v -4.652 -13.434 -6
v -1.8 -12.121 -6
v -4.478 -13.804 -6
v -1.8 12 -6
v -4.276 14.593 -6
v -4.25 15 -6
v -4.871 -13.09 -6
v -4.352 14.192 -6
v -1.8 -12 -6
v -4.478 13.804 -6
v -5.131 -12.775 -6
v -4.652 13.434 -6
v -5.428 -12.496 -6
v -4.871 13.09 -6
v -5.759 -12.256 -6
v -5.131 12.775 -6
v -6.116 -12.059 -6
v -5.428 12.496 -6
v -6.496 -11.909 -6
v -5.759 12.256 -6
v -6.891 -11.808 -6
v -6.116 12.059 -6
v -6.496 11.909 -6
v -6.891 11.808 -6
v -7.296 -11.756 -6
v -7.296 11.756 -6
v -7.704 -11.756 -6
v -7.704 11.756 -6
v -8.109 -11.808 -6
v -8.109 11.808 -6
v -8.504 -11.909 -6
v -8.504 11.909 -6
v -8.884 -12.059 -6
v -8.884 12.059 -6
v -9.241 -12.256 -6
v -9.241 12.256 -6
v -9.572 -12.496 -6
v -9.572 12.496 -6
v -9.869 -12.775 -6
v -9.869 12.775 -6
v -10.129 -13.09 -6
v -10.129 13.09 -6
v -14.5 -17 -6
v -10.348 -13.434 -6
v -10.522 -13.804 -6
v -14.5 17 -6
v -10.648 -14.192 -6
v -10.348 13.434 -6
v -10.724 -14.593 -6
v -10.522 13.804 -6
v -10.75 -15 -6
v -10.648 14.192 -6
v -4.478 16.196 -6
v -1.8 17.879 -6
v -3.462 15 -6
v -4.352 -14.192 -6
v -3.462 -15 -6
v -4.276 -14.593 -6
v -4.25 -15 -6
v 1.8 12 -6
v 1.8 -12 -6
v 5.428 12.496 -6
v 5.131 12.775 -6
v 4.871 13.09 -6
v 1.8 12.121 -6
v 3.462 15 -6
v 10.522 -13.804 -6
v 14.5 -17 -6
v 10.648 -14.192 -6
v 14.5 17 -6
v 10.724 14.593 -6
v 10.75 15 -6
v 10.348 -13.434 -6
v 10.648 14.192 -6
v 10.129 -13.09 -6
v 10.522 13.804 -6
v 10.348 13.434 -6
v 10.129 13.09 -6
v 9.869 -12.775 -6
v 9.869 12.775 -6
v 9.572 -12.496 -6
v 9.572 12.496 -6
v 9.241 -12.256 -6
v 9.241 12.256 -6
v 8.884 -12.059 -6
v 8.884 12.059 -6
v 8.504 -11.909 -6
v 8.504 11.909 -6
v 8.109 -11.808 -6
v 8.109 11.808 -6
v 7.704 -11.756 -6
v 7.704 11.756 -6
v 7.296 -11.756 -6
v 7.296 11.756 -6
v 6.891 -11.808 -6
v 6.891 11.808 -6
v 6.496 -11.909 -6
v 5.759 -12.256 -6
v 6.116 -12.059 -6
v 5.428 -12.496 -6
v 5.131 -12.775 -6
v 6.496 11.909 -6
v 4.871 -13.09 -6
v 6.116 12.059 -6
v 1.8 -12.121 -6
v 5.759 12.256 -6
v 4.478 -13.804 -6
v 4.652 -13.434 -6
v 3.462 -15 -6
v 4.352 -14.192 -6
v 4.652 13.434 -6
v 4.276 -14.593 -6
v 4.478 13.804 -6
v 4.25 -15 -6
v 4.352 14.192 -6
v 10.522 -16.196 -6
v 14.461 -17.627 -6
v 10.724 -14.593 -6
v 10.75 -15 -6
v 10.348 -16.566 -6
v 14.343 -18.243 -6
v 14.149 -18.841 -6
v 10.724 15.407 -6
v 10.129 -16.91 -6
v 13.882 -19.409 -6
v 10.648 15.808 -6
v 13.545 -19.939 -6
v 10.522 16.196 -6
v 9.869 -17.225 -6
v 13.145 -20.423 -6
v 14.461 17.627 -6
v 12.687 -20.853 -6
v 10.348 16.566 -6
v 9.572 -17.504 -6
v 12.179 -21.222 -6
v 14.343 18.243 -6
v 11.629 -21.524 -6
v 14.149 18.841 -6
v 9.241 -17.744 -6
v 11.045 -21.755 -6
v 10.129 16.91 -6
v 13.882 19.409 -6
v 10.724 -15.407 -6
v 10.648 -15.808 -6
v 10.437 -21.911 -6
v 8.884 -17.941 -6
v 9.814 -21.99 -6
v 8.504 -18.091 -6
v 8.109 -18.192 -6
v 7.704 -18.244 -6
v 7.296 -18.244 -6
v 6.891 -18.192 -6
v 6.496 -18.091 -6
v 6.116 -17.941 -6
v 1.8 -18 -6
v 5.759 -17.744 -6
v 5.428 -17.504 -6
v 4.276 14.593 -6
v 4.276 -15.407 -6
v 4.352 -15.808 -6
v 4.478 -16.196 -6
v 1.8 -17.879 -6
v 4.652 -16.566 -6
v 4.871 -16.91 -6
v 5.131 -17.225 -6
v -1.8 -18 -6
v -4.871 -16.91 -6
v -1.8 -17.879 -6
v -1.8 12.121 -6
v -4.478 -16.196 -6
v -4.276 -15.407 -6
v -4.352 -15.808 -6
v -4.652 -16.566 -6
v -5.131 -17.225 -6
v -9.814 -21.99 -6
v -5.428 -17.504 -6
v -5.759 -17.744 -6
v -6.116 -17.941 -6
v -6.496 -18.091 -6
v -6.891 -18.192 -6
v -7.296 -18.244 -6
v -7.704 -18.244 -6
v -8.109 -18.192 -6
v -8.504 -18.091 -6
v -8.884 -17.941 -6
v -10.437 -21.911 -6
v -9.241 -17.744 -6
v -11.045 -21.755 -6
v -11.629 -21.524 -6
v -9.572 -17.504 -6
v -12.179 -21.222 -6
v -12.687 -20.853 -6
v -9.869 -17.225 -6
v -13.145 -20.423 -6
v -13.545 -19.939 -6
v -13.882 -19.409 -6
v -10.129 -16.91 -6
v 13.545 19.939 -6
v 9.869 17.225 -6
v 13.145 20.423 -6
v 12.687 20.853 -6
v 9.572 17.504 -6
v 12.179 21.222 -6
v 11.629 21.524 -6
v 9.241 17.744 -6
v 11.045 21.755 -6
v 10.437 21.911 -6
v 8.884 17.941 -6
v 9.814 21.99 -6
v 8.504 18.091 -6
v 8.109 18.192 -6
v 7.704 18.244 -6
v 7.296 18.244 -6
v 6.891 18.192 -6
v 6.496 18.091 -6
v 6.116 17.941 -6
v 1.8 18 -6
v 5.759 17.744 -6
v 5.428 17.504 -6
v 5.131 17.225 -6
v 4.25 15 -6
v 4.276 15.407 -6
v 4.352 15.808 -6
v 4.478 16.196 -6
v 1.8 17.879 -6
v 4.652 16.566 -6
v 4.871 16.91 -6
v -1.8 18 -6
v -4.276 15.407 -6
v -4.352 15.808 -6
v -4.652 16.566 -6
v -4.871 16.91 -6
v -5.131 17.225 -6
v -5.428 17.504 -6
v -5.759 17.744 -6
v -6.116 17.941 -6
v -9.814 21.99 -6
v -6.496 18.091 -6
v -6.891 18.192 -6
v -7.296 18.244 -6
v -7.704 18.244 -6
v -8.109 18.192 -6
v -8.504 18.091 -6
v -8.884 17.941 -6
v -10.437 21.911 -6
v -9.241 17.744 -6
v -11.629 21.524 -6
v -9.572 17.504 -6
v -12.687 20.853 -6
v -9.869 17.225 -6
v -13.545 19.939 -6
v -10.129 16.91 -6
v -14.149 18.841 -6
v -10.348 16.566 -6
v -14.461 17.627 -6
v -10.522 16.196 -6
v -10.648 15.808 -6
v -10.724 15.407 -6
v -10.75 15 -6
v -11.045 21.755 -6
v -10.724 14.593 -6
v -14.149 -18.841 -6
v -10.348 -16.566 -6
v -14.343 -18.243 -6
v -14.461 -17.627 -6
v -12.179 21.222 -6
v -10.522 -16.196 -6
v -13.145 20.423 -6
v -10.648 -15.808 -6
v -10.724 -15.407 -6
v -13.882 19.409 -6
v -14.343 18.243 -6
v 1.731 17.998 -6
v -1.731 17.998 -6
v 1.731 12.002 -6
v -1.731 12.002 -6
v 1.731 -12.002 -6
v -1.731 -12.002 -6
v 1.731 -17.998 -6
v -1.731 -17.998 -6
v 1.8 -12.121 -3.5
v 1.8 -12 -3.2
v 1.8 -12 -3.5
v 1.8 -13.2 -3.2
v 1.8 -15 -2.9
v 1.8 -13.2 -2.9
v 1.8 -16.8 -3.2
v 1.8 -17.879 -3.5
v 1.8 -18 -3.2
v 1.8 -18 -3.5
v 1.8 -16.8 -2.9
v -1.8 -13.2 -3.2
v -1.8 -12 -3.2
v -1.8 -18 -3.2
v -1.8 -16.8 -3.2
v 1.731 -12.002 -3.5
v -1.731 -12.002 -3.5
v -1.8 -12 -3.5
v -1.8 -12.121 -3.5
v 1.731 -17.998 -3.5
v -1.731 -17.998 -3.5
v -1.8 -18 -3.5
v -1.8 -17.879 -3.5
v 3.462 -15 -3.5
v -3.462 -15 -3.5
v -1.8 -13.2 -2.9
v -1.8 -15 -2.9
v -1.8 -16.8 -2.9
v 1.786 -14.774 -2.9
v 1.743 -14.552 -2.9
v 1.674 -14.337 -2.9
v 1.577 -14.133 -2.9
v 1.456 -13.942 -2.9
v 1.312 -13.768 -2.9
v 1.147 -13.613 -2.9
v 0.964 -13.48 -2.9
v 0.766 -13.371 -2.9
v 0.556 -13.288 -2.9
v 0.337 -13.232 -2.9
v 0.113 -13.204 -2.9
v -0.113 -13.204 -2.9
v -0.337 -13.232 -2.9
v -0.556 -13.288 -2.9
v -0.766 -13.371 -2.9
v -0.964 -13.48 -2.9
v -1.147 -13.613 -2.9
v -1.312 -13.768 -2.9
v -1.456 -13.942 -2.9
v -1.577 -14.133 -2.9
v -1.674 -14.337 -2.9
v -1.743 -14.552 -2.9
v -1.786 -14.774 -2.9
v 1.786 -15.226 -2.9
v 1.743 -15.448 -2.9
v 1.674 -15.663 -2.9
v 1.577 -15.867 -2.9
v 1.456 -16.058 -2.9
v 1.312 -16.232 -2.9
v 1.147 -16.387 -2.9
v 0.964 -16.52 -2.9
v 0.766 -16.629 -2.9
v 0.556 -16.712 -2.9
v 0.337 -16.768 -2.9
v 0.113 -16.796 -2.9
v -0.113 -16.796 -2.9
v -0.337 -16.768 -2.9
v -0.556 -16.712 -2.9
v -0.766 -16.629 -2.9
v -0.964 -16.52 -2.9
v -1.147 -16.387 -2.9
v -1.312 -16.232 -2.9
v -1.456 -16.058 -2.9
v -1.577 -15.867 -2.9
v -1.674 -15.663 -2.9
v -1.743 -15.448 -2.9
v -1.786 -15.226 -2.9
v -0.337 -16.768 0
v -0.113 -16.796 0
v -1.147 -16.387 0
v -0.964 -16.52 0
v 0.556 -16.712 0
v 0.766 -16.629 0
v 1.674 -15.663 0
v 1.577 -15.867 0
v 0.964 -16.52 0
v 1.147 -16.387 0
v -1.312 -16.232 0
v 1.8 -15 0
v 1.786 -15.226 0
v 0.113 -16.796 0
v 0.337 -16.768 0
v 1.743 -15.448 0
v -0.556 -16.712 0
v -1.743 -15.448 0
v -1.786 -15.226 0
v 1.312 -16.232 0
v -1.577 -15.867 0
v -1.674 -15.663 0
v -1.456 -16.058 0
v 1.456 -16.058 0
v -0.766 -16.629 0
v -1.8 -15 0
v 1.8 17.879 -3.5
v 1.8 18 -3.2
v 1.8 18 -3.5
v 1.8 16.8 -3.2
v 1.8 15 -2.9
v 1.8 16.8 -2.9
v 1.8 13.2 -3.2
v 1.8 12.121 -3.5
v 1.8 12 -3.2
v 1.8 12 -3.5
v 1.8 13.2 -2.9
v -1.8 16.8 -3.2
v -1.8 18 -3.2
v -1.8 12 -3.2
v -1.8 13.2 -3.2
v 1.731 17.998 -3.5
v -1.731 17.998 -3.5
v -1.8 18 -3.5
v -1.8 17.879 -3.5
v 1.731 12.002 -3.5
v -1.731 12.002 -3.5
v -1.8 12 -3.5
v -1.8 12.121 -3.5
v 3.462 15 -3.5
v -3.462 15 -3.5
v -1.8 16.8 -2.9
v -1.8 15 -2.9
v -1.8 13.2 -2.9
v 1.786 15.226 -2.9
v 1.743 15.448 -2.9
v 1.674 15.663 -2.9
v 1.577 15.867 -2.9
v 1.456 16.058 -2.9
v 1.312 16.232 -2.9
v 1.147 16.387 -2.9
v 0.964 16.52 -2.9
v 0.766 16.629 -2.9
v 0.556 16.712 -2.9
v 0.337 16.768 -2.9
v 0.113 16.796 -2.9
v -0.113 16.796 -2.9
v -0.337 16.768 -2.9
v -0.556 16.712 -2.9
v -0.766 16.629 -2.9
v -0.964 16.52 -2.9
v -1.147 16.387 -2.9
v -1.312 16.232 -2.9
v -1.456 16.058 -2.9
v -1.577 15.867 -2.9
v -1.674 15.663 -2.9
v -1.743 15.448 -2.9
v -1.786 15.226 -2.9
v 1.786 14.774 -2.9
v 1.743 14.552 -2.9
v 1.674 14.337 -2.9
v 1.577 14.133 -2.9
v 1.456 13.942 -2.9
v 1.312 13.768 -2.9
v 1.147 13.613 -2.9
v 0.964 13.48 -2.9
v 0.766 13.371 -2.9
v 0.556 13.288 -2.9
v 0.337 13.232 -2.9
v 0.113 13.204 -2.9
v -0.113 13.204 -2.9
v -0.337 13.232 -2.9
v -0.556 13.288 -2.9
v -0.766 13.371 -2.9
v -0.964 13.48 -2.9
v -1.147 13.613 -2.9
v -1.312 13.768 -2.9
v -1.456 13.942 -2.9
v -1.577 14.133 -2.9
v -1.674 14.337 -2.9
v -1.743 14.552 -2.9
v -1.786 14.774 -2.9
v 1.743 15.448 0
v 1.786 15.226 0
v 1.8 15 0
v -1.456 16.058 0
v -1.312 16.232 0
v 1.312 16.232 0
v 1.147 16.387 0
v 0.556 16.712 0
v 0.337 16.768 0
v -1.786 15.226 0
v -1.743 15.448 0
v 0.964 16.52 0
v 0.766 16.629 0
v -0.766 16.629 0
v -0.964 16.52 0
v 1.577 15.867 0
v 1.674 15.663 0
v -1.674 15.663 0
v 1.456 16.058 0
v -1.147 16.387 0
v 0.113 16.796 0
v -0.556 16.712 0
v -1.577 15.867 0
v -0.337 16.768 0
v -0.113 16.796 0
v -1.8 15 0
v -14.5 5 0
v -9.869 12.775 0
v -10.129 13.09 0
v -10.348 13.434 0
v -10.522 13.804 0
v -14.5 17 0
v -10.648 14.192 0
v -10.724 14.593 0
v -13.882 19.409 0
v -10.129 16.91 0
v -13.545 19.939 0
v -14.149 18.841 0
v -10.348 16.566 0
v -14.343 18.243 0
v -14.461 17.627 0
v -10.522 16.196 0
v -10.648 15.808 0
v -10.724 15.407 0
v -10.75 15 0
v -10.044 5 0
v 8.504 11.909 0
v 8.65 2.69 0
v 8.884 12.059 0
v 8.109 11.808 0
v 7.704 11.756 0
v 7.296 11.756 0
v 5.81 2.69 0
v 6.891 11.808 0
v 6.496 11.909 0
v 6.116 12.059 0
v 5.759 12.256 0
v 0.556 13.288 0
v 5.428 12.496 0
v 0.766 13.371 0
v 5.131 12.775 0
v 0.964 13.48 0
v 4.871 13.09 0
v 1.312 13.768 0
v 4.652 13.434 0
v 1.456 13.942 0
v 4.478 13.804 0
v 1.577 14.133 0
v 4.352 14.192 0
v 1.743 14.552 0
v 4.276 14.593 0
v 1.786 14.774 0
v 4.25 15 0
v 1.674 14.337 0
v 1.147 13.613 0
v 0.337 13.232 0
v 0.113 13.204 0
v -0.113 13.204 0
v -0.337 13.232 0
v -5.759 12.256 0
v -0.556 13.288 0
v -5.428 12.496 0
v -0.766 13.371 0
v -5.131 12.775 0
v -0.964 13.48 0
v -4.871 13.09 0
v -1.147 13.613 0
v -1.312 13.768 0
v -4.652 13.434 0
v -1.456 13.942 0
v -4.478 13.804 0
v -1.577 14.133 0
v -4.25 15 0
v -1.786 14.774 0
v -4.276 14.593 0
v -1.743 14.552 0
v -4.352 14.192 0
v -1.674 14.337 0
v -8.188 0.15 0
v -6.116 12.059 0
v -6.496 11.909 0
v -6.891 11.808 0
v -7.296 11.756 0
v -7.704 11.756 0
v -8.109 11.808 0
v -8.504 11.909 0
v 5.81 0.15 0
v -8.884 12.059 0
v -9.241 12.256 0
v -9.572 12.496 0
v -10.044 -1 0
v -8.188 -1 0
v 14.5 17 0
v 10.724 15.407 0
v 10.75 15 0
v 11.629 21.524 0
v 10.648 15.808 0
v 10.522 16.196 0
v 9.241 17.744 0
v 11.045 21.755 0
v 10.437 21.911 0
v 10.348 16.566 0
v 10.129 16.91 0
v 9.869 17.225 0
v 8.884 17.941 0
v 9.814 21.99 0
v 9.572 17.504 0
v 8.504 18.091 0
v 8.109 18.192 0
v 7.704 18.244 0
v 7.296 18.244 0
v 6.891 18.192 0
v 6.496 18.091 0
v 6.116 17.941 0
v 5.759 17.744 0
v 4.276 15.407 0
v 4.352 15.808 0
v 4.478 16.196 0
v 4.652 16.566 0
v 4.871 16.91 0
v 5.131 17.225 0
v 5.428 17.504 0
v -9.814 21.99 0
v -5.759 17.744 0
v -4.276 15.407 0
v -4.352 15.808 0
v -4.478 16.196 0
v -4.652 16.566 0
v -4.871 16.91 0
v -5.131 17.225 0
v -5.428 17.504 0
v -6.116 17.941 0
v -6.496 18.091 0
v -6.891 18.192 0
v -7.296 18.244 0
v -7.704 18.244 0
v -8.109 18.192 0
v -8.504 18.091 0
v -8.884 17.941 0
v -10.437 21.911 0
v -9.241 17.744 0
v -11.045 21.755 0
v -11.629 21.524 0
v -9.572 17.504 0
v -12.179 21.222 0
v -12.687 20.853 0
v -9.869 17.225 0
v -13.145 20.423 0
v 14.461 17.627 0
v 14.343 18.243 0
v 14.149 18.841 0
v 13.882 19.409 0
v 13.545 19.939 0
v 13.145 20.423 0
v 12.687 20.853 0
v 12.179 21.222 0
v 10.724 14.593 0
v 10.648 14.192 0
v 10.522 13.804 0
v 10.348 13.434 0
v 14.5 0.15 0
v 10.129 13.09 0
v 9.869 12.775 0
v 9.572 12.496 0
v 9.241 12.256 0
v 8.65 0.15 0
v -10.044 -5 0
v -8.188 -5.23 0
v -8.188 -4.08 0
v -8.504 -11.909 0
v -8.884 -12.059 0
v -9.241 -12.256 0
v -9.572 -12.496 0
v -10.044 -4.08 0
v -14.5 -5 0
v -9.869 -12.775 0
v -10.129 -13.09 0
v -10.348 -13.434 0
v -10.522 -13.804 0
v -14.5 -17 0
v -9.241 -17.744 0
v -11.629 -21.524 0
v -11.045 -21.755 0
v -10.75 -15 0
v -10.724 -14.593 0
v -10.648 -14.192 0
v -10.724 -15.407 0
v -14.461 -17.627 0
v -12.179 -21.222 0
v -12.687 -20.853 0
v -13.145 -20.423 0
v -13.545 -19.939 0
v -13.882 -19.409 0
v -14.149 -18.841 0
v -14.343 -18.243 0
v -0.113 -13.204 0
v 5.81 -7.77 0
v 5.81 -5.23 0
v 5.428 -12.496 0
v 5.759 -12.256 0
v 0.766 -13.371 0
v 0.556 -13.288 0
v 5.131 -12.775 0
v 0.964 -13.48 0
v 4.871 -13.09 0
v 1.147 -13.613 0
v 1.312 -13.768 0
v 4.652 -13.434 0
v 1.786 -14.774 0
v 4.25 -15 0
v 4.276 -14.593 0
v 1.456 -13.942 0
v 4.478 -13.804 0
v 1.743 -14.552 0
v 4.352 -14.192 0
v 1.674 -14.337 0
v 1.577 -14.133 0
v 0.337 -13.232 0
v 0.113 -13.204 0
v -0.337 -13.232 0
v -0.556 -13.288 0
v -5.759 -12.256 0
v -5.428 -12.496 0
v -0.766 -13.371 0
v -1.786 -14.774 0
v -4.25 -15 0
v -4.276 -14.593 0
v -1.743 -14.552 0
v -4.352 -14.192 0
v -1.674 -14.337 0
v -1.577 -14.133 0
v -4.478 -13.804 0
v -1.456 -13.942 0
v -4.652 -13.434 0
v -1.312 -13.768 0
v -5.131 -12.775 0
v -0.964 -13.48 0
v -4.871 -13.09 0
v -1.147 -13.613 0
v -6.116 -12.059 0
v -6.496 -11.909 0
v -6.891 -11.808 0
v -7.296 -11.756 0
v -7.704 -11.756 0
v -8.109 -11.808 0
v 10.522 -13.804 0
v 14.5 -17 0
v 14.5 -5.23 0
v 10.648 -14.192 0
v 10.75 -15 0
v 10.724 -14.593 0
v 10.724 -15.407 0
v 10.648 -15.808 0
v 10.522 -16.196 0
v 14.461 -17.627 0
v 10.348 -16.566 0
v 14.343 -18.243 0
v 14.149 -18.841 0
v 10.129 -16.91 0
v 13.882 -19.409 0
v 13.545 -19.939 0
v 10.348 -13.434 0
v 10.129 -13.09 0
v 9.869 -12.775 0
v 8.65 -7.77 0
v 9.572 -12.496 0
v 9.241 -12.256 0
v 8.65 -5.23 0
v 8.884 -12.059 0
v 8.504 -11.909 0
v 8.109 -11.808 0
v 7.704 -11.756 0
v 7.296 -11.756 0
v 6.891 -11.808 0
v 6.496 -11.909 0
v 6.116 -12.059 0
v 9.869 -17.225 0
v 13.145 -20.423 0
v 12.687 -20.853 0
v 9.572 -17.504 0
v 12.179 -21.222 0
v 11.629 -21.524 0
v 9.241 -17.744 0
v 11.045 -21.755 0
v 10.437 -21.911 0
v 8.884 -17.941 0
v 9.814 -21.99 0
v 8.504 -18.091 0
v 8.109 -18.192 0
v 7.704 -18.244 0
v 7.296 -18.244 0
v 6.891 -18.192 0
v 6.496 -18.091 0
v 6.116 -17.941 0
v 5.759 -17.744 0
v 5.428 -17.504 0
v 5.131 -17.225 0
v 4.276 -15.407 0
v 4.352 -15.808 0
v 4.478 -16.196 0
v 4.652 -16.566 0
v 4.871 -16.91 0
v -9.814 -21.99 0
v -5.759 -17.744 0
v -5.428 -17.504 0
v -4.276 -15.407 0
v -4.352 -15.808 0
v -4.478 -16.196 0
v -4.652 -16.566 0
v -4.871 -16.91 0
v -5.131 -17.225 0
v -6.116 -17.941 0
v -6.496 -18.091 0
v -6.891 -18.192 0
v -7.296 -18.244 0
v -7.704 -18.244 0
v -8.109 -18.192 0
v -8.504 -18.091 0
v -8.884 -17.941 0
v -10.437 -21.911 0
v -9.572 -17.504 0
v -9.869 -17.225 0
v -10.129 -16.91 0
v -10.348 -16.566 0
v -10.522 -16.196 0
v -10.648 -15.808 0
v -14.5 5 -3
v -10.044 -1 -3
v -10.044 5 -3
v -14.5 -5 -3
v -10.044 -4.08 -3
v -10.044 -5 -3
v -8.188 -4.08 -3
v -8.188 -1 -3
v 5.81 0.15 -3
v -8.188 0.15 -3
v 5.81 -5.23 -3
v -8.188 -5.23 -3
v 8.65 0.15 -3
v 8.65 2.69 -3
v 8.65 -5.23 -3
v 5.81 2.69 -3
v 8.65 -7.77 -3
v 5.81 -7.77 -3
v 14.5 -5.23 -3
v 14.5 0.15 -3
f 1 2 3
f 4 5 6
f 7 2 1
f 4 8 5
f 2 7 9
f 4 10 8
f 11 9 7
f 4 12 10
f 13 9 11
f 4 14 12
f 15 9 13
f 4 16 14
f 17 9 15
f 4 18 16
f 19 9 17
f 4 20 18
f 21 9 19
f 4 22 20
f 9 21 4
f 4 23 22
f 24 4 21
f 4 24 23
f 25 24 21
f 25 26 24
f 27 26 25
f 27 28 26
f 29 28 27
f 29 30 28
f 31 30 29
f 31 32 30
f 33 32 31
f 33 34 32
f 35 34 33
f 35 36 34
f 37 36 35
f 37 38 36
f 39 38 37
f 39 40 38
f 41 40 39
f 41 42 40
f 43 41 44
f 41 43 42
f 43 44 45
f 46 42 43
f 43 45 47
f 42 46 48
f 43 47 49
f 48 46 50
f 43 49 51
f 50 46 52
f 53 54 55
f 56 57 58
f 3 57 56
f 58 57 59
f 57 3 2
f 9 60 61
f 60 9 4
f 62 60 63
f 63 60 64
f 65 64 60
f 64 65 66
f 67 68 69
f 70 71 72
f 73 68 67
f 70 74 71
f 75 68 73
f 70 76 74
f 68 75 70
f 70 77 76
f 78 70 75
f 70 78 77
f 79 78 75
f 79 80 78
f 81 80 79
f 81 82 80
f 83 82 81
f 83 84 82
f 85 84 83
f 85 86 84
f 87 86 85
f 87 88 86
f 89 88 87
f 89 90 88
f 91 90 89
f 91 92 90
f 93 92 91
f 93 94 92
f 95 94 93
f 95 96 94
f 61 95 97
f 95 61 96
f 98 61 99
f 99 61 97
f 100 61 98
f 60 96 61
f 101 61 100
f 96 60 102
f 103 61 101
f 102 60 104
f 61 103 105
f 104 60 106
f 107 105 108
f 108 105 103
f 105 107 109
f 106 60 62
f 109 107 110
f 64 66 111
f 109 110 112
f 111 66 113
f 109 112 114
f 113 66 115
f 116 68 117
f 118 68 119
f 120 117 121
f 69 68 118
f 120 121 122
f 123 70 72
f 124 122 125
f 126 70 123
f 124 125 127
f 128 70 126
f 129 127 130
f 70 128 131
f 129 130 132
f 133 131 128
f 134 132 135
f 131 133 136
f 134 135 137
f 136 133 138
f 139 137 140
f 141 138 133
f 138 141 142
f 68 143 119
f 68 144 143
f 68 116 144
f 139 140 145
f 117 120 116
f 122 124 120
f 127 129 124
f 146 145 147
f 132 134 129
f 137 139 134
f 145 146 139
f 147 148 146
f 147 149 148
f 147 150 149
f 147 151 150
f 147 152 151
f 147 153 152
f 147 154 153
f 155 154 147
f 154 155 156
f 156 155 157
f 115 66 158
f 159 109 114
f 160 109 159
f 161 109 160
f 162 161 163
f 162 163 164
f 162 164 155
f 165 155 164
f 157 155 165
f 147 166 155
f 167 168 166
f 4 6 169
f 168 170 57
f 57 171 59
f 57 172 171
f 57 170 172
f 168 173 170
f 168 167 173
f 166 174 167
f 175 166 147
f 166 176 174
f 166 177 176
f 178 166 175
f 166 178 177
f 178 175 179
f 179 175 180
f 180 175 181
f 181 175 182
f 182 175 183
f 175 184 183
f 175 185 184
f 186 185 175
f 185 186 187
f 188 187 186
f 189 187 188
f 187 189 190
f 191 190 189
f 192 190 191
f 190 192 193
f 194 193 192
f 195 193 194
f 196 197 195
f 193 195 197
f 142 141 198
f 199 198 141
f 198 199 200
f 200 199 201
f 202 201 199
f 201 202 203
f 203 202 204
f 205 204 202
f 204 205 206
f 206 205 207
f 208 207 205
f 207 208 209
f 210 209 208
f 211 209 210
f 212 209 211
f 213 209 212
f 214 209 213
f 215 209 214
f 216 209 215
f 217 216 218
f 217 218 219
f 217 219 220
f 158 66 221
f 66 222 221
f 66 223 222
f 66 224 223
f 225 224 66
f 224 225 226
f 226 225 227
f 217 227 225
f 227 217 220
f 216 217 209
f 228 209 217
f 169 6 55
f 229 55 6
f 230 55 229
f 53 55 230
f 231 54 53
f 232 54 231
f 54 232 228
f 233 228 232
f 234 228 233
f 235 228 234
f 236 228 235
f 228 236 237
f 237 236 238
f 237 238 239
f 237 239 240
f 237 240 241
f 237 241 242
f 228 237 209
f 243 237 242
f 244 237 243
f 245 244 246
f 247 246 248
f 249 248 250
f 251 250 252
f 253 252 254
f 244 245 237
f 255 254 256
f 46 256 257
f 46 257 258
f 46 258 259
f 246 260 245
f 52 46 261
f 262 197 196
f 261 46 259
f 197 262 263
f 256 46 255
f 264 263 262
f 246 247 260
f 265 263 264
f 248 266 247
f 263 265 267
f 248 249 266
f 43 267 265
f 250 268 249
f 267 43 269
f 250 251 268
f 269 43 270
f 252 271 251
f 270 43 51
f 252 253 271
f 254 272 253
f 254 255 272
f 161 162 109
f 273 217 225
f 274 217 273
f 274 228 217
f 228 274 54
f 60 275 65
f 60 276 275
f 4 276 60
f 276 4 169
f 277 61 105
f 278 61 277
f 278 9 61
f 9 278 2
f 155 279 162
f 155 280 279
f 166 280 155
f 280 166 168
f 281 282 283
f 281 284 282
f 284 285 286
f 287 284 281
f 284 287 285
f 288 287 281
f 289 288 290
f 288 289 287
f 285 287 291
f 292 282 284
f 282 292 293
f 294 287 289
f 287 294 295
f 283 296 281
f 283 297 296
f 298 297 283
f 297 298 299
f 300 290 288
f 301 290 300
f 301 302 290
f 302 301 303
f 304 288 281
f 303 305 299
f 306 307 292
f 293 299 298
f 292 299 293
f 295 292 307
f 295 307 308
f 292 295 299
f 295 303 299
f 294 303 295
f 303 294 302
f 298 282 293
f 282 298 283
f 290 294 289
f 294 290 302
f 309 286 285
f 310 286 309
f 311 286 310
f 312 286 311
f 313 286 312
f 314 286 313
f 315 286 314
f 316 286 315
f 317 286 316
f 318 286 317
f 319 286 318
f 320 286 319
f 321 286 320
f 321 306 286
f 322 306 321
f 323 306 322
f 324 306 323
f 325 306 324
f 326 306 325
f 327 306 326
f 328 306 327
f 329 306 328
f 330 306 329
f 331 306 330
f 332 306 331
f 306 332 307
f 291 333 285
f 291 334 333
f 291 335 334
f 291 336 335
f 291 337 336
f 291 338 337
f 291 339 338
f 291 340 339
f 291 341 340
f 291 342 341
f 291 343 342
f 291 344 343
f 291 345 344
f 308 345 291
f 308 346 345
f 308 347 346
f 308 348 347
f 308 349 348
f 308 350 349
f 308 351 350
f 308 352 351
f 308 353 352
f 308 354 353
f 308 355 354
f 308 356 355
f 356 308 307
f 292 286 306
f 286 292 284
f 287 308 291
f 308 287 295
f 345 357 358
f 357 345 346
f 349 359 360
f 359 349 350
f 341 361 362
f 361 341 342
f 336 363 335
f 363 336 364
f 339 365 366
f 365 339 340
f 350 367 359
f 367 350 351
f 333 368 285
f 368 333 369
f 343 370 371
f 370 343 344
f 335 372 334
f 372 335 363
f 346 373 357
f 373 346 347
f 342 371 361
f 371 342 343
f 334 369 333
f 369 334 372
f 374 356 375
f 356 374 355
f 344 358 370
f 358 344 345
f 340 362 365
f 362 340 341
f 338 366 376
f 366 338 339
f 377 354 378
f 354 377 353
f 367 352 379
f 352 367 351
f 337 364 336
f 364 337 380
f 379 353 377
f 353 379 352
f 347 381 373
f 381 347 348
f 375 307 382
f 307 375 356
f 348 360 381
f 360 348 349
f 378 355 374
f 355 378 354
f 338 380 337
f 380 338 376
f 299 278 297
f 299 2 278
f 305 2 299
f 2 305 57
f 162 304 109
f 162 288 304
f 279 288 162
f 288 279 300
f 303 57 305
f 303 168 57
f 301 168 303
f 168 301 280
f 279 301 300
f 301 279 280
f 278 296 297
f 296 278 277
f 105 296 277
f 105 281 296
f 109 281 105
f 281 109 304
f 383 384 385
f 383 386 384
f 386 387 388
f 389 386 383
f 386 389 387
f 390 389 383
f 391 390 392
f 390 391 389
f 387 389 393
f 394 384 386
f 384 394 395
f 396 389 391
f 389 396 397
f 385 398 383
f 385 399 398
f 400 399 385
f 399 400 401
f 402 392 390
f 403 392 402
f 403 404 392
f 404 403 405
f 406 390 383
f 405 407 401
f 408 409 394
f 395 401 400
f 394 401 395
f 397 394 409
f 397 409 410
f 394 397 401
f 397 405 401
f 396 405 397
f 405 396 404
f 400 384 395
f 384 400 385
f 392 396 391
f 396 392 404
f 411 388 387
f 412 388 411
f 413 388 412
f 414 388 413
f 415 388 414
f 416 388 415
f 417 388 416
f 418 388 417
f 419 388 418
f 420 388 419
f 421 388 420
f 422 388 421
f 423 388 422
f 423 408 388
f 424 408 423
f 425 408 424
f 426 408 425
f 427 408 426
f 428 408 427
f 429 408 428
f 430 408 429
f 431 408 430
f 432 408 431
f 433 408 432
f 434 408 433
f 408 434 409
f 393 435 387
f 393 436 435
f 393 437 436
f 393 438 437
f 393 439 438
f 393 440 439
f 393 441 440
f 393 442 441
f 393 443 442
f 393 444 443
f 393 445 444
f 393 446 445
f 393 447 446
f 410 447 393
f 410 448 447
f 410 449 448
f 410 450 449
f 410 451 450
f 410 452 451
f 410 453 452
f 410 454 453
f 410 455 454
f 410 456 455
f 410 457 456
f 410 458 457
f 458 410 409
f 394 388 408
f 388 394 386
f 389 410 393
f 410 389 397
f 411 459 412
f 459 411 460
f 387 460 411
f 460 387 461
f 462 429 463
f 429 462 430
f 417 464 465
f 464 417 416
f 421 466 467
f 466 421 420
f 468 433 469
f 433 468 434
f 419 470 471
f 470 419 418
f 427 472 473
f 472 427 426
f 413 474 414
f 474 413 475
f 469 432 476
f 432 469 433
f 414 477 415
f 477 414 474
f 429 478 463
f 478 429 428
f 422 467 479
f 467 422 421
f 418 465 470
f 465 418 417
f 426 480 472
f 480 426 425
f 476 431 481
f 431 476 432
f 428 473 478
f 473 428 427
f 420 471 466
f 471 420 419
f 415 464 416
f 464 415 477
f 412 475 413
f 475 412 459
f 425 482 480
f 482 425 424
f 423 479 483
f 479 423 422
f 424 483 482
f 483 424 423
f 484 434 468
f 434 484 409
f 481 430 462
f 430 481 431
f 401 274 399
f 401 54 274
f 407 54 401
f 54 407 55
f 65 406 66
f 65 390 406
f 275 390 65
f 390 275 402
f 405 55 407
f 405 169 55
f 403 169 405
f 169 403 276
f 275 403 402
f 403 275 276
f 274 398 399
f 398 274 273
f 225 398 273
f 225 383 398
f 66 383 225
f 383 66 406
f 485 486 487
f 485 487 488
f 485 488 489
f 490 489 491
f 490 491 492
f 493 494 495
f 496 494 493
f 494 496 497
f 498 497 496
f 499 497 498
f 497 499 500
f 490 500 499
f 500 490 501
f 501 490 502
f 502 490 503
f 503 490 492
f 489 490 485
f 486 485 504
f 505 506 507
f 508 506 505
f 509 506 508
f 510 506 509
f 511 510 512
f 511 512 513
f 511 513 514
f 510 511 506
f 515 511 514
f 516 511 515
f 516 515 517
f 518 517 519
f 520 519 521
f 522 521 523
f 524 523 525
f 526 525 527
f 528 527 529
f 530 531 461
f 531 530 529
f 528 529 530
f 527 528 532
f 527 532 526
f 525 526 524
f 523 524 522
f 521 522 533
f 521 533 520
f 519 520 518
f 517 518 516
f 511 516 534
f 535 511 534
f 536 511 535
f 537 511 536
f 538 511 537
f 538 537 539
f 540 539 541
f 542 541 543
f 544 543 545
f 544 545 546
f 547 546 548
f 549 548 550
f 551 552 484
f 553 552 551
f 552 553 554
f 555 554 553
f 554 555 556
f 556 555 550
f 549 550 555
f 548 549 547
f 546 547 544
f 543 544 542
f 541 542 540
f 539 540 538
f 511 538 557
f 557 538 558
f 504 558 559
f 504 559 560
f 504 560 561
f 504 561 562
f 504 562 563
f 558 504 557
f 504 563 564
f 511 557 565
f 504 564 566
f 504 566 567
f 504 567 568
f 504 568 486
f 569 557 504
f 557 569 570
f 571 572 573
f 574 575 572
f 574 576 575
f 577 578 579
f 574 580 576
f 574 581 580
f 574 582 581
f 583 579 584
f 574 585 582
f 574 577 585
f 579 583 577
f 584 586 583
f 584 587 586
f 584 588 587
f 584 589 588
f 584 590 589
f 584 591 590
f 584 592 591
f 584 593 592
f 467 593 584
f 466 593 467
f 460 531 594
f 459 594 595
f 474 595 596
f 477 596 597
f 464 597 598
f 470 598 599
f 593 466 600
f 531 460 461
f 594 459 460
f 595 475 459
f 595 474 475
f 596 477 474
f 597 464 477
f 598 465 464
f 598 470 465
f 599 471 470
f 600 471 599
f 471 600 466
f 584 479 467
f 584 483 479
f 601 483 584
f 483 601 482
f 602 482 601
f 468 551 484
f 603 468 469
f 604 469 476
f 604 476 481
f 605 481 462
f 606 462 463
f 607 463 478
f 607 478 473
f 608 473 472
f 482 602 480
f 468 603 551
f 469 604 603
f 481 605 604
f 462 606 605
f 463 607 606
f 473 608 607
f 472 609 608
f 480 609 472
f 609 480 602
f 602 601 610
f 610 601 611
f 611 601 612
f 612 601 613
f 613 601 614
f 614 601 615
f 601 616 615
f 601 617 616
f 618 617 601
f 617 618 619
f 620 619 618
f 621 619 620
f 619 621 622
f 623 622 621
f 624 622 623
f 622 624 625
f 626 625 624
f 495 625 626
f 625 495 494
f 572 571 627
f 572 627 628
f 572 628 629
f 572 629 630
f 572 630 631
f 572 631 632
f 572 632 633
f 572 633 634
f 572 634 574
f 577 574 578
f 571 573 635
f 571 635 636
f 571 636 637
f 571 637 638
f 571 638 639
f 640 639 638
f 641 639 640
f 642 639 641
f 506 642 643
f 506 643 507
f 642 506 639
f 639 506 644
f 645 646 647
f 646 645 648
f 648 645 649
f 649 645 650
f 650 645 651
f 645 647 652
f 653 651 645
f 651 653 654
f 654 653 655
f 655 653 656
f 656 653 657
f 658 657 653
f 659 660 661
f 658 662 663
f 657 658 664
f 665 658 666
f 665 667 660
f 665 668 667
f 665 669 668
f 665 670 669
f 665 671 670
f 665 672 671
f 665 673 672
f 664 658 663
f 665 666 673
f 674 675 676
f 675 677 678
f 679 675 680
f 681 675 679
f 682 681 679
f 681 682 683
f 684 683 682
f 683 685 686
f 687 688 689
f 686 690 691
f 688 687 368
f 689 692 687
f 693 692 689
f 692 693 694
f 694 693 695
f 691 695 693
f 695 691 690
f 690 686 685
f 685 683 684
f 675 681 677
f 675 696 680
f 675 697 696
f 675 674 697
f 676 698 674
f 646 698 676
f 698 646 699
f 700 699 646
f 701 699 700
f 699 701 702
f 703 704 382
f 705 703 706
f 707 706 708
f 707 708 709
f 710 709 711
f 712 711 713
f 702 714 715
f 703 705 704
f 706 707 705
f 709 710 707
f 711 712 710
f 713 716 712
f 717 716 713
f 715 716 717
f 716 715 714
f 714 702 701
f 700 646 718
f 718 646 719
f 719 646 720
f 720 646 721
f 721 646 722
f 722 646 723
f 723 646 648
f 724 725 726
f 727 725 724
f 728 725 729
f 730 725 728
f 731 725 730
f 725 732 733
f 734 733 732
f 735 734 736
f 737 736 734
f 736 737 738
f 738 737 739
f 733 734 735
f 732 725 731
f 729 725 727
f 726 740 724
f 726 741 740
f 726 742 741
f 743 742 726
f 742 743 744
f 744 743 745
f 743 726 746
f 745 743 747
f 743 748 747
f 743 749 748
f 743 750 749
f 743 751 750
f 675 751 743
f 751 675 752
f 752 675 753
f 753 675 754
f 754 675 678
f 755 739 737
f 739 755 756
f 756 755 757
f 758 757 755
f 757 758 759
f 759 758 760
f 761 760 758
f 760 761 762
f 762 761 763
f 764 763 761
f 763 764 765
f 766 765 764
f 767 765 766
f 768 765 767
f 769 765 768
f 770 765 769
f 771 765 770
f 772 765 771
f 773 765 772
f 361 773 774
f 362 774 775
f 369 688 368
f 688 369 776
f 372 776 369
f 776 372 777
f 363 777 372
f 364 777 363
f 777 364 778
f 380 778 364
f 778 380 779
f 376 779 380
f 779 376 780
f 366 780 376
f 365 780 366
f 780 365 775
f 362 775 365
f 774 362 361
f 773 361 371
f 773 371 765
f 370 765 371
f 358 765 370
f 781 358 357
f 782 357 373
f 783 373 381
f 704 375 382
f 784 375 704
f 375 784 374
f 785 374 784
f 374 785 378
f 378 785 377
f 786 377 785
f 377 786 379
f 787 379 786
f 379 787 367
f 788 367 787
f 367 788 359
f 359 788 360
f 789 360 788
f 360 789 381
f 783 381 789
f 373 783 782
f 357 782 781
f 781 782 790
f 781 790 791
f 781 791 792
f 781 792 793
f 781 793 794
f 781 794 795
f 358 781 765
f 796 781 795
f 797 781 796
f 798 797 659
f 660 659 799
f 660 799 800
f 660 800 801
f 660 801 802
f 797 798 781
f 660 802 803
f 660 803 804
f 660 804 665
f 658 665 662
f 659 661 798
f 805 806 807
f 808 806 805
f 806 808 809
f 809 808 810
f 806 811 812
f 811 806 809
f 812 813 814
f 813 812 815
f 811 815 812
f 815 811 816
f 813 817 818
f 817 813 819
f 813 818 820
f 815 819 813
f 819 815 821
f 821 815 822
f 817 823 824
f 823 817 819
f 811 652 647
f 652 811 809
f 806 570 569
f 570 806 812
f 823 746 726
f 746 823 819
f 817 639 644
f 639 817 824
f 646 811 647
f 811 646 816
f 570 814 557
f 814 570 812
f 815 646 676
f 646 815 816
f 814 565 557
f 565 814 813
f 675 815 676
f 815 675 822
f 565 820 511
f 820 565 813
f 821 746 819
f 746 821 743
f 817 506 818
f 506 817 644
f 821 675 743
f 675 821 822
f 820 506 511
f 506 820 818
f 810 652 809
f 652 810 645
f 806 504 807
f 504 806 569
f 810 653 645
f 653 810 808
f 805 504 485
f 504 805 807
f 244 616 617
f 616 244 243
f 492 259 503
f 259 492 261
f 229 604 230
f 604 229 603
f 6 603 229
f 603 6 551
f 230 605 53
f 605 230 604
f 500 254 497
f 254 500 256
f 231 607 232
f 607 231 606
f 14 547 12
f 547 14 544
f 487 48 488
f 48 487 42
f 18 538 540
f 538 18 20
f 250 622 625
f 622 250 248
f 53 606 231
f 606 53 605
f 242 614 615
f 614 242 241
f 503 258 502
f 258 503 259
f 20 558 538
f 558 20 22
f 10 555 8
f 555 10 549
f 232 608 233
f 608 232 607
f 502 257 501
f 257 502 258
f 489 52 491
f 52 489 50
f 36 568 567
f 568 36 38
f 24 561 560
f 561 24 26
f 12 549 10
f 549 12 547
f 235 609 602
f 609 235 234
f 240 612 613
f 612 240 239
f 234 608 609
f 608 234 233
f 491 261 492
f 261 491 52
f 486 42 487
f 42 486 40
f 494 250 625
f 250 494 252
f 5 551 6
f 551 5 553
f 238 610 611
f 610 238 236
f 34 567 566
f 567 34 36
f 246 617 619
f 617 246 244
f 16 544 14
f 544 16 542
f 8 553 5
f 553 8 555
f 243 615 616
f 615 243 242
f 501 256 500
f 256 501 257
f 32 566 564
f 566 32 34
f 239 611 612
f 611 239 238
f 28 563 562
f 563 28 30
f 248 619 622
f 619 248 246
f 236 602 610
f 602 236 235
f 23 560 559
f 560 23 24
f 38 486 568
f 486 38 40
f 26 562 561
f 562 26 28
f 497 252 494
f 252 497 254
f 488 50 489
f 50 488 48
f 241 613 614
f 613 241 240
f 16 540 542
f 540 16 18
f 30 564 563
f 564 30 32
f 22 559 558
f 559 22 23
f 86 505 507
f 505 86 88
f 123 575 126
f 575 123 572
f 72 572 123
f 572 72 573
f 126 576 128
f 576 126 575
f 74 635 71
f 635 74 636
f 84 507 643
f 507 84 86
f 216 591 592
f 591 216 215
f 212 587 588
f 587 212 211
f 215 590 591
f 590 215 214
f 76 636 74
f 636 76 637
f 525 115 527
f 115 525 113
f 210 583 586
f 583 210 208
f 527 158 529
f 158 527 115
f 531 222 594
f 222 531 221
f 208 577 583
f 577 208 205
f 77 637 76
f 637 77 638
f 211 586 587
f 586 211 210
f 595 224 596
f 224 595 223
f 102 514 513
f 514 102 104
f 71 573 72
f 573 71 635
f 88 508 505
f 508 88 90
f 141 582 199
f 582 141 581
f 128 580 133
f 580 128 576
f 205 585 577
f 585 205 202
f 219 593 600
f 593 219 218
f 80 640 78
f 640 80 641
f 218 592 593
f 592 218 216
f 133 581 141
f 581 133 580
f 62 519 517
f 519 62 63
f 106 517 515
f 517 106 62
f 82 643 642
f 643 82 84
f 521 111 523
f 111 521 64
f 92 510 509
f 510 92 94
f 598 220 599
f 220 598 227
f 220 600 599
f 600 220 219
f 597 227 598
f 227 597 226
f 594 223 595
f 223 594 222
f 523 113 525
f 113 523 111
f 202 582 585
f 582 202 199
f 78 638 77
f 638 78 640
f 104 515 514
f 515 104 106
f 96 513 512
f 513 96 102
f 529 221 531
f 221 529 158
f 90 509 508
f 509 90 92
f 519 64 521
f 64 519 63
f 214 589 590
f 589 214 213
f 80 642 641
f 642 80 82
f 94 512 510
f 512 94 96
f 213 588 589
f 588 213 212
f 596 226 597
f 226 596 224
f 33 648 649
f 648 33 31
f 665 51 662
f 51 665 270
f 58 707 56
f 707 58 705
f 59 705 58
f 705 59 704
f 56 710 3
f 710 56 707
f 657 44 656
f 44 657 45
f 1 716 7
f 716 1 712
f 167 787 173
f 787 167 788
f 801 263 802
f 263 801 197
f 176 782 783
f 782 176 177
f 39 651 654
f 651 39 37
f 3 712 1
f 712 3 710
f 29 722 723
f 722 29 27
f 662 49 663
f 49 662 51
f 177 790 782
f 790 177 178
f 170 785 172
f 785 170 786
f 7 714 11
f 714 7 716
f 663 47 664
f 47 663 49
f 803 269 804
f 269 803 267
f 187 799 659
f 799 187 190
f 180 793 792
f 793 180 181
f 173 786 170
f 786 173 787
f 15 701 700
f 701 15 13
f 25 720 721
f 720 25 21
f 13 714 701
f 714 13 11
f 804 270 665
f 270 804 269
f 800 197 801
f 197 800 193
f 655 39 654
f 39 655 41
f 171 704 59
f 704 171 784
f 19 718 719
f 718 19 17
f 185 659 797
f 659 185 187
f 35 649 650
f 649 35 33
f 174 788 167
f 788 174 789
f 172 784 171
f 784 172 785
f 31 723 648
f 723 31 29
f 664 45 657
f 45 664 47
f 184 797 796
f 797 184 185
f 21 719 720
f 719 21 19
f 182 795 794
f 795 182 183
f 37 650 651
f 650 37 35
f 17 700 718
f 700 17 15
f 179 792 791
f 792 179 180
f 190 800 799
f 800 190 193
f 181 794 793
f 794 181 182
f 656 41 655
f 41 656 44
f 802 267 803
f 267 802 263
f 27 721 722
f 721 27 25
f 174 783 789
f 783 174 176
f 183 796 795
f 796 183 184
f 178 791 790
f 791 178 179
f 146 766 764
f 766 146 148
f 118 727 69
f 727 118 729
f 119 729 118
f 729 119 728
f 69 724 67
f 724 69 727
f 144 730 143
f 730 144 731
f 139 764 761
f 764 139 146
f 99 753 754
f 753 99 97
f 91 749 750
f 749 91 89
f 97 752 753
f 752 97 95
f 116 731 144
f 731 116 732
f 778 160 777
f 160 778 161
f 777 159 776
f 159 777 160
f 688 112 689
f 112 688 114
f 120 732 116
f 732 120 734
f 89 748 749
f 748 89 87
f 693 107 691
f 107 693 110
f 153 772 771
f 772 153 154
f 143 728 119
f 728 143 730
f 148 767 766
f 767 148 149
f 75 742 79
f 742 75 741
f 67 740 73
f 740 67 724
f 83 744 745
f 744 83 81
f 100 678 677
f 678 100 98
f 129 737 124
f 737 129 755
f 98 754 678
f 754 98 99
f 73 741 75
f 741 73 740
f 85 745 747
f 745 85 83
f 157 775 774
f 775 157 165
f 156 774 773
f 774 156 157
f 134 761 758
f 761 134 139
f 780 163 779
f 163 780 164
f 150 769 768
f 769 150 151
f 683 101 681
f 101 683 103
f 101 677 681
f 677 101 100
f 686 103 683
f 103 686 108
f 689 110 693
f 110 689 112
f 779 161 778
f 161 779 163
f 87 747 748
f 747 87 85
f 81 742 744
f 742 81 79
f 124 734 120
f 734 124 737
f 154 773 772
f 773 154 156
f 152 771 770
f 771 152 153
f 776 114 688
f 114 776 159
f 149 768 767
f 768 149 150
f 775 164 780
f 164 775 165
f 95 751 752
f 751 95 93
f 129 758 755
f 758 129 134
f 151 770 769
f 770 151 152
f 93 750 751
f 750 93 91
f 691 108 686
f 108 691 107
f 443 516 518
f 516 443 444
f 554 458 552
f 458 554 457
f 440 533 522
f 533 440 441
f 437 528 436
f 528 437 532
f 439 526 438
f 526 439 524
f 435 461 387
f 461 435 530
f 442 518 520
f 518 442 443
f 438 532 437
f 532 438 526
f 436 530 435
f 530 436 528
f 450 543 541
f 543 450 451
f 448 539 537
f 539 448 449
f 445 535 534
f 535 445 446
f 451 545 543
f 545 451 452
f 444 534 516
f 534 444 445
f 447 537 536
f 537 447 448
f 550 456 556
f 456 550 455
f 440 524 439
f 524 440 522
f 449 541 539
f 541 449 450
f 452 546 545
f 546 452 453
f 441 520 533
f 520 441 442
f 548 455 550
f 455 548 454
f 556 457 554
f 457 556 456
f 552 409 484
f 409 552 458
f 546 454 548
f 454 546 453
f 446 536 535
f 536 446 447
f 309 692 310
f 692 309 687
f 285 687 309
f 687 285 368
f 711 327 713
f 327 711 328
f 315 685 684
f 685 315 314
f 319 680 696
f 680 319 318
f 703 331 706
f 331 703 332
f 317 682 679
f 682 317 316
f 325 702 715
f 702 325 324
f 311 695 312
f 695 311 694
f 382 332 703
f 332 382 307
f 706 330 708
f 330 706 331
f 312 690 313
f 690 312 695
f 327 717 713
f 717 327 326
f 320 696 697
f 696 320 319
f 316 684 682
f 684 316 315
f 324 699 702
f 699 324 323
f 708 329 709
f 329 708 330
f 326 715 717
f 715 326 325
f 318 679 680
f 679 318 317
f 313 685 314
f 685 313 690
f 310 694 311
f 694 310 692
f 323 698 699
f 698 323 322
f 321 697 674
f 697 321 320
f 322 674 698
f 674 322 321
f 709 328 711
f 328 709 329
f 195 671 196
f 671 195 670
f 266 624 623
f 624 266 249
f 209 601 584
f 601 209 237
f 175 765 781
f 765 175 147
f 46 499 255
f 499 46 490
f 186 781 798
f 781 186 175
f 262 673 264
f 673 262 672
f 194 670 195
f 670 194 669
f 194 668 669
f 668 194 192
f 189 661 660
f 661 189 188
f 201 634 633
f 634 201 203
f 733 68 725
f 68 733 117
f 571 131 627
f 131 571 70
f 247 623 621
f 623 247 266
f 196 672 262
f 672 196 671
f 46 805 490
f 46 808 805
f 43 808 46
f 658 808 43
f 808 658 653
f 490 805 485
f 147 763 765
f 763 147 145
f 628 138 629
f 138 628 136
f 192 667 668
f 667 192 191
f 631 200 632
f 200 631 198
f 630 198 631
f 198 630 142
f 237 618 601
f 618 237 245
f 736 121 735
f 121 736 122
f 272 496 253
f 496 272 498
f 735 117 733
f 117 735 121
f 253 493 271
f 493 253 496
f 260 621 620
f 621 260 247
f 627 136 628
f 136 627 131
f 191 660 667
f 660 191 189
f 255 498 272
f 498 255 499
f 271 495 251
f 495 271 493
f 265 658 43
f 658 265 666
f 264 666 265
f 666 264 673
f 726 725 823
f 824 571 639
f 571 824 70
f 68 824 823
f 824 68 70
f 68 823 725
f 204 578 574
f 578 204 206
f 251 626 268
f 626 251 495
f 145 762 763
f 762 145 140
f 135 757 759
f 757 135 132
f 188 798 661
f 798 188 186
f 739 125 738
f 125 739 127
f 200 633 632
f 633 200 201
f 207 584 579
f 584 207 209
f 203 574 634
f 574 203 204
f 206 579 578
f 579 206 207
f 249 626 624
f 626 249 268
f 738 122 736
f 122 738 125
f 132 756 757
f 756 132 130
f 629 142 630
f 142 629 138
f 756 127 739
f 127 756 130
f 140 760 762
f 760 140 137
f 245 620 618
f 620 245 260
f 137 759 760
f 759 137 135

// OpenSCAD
$fn = 50;


difference() {
	union() {
		*color(alpha = 1.0000000000, c = "gray") {
			translate(v = [0, 14, -6]) {
				linear_extrude(height = 3) {
					text(font = "Arial:style=Bold", halign = "center", size = 4.5000000000, text = "COMMENT description oobb_plate_shape_positive_type_6_depth_0_0_-6_pos_motor_extra_6_thickness_2_width_3_height_0_0_-6_pos_plate", valign = "center");
				}
			}
		}
		translate(v = [0, 0, -6]) {
			hull() {
				translate(v = [-9.5000000000, 17.0000000000, 0]) {
					cylinder(h = 6, r = 5);
				}
				translate(v = [9.5000000000, 17.0000000000, 0]) {
					cylinder(h = 6, r = 5);
				}
				translate(v = [-9.5000000000, -17.0000000000, 0]) {
					cylinder(h = 6, r = 5);
				}
				translate(v = [9.5000000000, -17.0000000000, 0]) {
					cylinder(h = 6, r = 5);
				}
			}
		}
		*color(alpha = 1.0000000000, c = "gray") {
			translate(v = [0, 14, -6]) {
				linear_extrude(height = 3) {
					text(font = "Arial:style=Bold", halign = "center", size = 4.5000000000, text = "COMMENT description oobb_holes_shape_p_type_0_0_-6_pos_motor_extra_6_thickness_2_width_3_height_0_0_-6_pos_plate_'left'_'right'_hole_sides_'left'_'right'_holes_true_both_holes", valign = "center");
				}
			}
		}
		*color(alpha = 1.0000000000, c = "gray") {
			translate(v = [-7.5000000000, 14, -3]) {
				rotate(a = [0, 0, 180]) {
					linear_extrude(height = 3) {
						text(font = "Arial:style=Bold", halign = "center", size = 4.5000000000, text = "COMMENT description oobb_wire_motor_shape_-7.5_0_-3_pos_motor_extra_6_thickness_2_width_3_height_0_0_-6_pos_plate_0_0_180_rot", valign = "center");
					}
				}
			}
		}
	}
	union() {
		translate(v = [0, -15, -6]) {
			rotate(a = [0, 0, 0]) {
				difference() {
					union() {
						translate(v = [-1.8000000000, -3.0000000000, -0.3000000000]) {
							cube(size = [3.6000000000, 6.0000000000, 0.3000000000]);
						}
						translate(v = [-1.8000000000, -1.8000000000, -0.6000000000]) {
							cube(size = [3.6000000000, 3.6000000000, 0.3000000000]);
						}
						translate(v = [-1.8000000000, -3.0000000000, 2.5000000000]) {
							cube(size = [3.6000000000, 6.0000000000, 0.3000000000]);
						}
						translate(v = [-1.8000000000, -1.8000000000, 2.8000000000]) {
							cube(size = [3.6000000000, 3.6000000000, 0.3000000000]);
						}
						translate(v = [0, 0, -50.0000000000]) {
							cylinder(h = 100, r = 1.8000000000);
						}
						linear_extrude(height = 2.5000000000) {
							polygon(points = [[3.4620000000, 0.0000000000], [1.7310000000, 2.9981799479], [-1.7310000000, 2.9981799479], [-3.4620000000, 0.0000000000], [-1.7310000000, -2.9981799479], [1.7310000000, -2.9981799479]]);
						}
						translate(v = [-1.8000000000, -3.0000000000, -0.3000000000]) {
							cube(size = [3.6000000000, 6.0000000000, 0.3000000000]);
						}
						translate(v = [-1.8000000000, -1.8000000000, -0.6000000000]) {
							cube(size = [3.6000000000, 3.6000000000, 0.3000000000]);
						}
						translate(v = [-1.8000000000, -3.0000000000, 2.5000000000]) {
							cube(size = [3.6000000000, 6.0000000000, 0.3000000000]);
						}
						translate(v = [-1.8000000000, -1.8000000000, 2.8000000000]) {
							cube(size = [3.6000000000, 3.6000000000, 0.3000000000]);
						}
						translate(v = [0, 0, -50.0000000000]) {
							cylinder(h = 100, r = 1.8000000000);
						}
						translate(v = [-1.8000000000, -3.0000000000, -0.3000000000]) {
							cube(size = [3.6000000000, 6.0000000000, 0.3000000000]);
						}
						translate(v = [-1.8000000000, -1.8000000000, -0.6000000000]) {
							cube(size = [3.6000000000, 3.6000000000, 0.3000000000]);
						}
						translate(v = [-1.8000000000, -3.0000000000, 2.5000000000]) {
							cube(size = [3.6000000000, 6.0000000000, 0.3000000000]);
						}
						translate(v = [-1.8000000000, -1.8000000000, 2.8000000000]) {
							cube(size = [3.6000000000, 3.6000000000, 0.3000000000]);
						}
						translate(v = [0, 0, -50.0000000000]) {
							cylinder(h = 100, r = 1.8000000000);
						}
					}
					union();
				}
			}
		}
		translate(v = [0, 15, -6]) {
			rotate(a = [0, 0, 0]) {
				difference() {
					union() {
						translate(v = [-1.8000000000, -3.0000000000, -0.3000000000]) {
							cube(size = [3.6000000000, 6.0000000000, 0.3000000000]);
						}
						translate(v = [-1.8000000000, -1.8000000000, -0.6000000000]) {
							cube(size = [3.6000000000, 3.6000000000, 0.3000000000]);
						}
						translate(v = [-1.8000000000, -3.0000000000, 2.5000000000]) {
							cube(size = [3.6000000000, 6.0000000000, 0.3000000000]);
						}
						translate(v = [-1.8000000000, -1.8000000000, 2.8000000000]) {
							cube(size = [3.6000000000, 3.6000000000, 0.3000000000]);
						}
						translate(v = [0, 0, -50.0000000000]) {
							cylinder(h = 100, r = 1.8000000000);
						}
						linear_extrude(height = 2.5000000000) {
							polygon(points = [[3.4620000000, 0.0000000000], [1.7310000000, 2.9981799479], [-1.7310000000, 2.9981799479], [-3.4620000000, 0.0000000000], [-1.7310000000, -2.9981799479], [1.7310000000, -2.9981799479]]);
						}
						translate(v = [-1.8000000000, -3.0000000000, -0.3000000000]) {
							cube(size = [3.6000000000, 6.0000000000, 0.3000000000]);
						}
						translate(v = [-1.8000000000, -1.8000000000, -0.6000000000]) {
							cube(size = [3.6000000000, 3.6000000000, 0.3000000000]);
						}
						translate(v = [-1.8000000000, -3.0000000000, 2.5000000000]) {
							cube(size = [3.6000000000, 6.0000000000, 0.3000000000]);
						}
						translate(v = [-1.8000000000, -1.8000000000, 2.8000000000]) {
							cube(size = [3.6000000000, 3.6000000000, 0.3000000000]);
						}
						translate(v = [0, 0, -50.0000000000]) {
							cylinder(h = 100, r = 1.8000000000);
						}
						translate(v = [-1.8000000000, -3.0000000000, -0.3000000000]) {
							cube(size = [3.6000000000, 6.0000000000, 0.3000000000]);
						}
						translate(v = [-1.8000000000, -1.8000000000, -0.6000000000]) {
							cube(size = [3.6000000000, 3.6000000000, 0.3000000000]);
						}
						translate(v = [-1.8000000000, -3.0000000000, 2.5000000000]) {
							cube(size = [3.6000000000, 6.0000000000, 0.3000000000]);
						}
						translate(v = [-1.8000000000, -1.8000000000, 2.8000000000]) {
							cube(size = [3.6000000000, 3.6000000000, 0.3000000000]);
						}
						translate(v = [0, 0, -50.0000000000]) {
							cylinder(h = 100, r = 1.8000000000);
						}
					}
					union();
				}
			}
		}
		translate(v = [15.0000000000, 0, -3]) {
			rotate(a = [0, 0, 180]) {
				difference() {
					union() {
						#translate(v = [23.0670000000, 1.0000000000, 0]) {
							cube(size = [5, 3.0800000000, 3]);
						}
						#translate(v = [0.2040000000, -0.1500000000, 0]) {
							cube(size = [6.3000000000, 5.3800000000, 3]);
						}
						#translate(v = [8.8880000000, -0.1500000000, 0]) {
							cube(size = [14.3000000000, 5.3800000000, 3]);
						}
						#translate(v = [6.3500000000, -2.6900000000, 0]) {
							cube(size = [2.8400000000, 10.4600000000, 3]);
						}
						#translate(v = [25.0440000000, -5.0000000000, 0]) {
							cube(size = [7, 10, 3]);
						}
					}
					union();
				}
			}
		}
		translate(v = [-7.5000000000, 15.0000000000, -50.0000000000]) {
			cylinder(h = 100, r = 3.2500000000);
		}
		translate(v = [7.5000000000, 15.0000000000, -50.0000000000]) {
			cylinder(h = 100, r = 3.2500000000);
		}
		translate(v = [-7.5000000000, -15.0000000000, -50.0000000000]) {
			cylinder(h = 100, r = 3.2500000000);
		}
		translate(v = [7.5000000000, -15.0000000000, -50.0000000000]) {
			cylinder(h = 100, r = 3.2500000000);
		}
		translate(v = [-7.5000000000, 15.0000000000, -50.0000000000]) {
			cylinder(h = 100, r = 1.8000000000);
		}
		translate(v = [0.0000000000, 15.0000000000, -50.0000000000]) {
			cylinder(h = 100, r = 1.8000000000);
		}
		translate(v = [7.5000000000, 15.0000000000, -50.0000000000]) {
			cylinder(h = 100, r = 1.8000000000);
		}
		translate(v = [-7.5000000000, -15.0000000000, -50.0000000000]) {
			cylinder(h = 100, r = 1.8000000000);
		}
		translate(v = [0.0000000000, -15.0000000000, -50.0000000000]) {
			cylinder(h = 100, r = 1.8000000000);
		}
		translate(v = [7.5000000000, -15.0000000000, -50.0000000000]) {
			cylinder(h = 100, r = 1.8000000000);
		}
		translate(v = [-7.5000000000, 15.0000000000, -50.0000000000]) {
			cylinder(h = 100, r = 1.8000000000);
		}
		translate(v = [0.0000000000, 15.0000000000, -50.0000000000]) {
			cylinder(h = 100, r = 1.8000000000);
		}
		translate(v = [7.5000000000, 15.0000000000, -50.0000000000]) {
			cylinder(h = 100, r = 1.8000000000);
		}
		translate(v = [-7.5000000000, -15.0000000000, -50.0000000000]) {
			cylinder(h = 100, r = 1.8000000000);
		}
		translate(v = [0.0000000000, -15.0000000000, -50.0000000000]) {
			cylinder(h = 100, r = 1.8000000000);
		}
		translate(v = [7.5000000000, -15.0000000000, -50.0000000000]) {
			cylinder(h = 100, r = 1.8000000000);
		}
		translate(v = [-7.5000000000, 15.0000000000, -50.0000000000]) {
			cylinder(h = 100, r = 1.8000000000);
		}
		translate(v = [0.0000000000, 15.0000000000, -50.0000000000]) {
			cylinder(h = 100, r = 1.8000000000);
		}
		translate(v = [7.5000000000, 15.0000000000, -50.0000000000]) {
			cylinder(h = 100, r = 1.8000000000);
		}
		translate(v = [-7.5000000000, -15.0000000000, -50.0000000000]) {
			cylinder(h = 100, r = 1.8000000000);
		}
		translate(v = [0.0000000000, -15.0000000000, -50.0000000000]) {
			cylinder(h = 100, r = 1.8000000000);
		}
		translate(v = [7.5000000000, -15.0000000000, -50.0000000000]) {
			cylinder(h = 100, r = 1.8000000000);
		}
		*color(alpha = 1.0000000000, c = "gray") {
			translate(v = [0, -1, -6]) {
				linear_extrude(height = 3) {
					text(font = "Arial:style=Bold", halign = "center", size = 4.5000000000, text = "COMMENT description oobb_nut_shape_negative_type_m3_radius_name_0_-15_-6_pos_6_thickness_2_width_3_height_0_0_-6_pos_plate_bottom_zz_true_overhang_0_0_0_rot_false_nut_true_hole", valign = "center");
				}
			}
		}
		*color(alpha = 1.0000000000, c = "gray") {
			translate(v = [0, 29, -6]) {
				linear_extrude(height = 3) {
					text(font = "Arial:style=Bold", halign = "center", size = 4.5000000000, text = "COMMENT description oobb_nut_shape_negative_type_m3_radius_name_0_15_-6_pos_6_thickness_2_width_3_height_0_0_-6_pos_plate_bottom_zz_true_overhang_0_0_0_rot_false_nut_true_hole", valign = "center");
				}
			}
		}
	}
}
